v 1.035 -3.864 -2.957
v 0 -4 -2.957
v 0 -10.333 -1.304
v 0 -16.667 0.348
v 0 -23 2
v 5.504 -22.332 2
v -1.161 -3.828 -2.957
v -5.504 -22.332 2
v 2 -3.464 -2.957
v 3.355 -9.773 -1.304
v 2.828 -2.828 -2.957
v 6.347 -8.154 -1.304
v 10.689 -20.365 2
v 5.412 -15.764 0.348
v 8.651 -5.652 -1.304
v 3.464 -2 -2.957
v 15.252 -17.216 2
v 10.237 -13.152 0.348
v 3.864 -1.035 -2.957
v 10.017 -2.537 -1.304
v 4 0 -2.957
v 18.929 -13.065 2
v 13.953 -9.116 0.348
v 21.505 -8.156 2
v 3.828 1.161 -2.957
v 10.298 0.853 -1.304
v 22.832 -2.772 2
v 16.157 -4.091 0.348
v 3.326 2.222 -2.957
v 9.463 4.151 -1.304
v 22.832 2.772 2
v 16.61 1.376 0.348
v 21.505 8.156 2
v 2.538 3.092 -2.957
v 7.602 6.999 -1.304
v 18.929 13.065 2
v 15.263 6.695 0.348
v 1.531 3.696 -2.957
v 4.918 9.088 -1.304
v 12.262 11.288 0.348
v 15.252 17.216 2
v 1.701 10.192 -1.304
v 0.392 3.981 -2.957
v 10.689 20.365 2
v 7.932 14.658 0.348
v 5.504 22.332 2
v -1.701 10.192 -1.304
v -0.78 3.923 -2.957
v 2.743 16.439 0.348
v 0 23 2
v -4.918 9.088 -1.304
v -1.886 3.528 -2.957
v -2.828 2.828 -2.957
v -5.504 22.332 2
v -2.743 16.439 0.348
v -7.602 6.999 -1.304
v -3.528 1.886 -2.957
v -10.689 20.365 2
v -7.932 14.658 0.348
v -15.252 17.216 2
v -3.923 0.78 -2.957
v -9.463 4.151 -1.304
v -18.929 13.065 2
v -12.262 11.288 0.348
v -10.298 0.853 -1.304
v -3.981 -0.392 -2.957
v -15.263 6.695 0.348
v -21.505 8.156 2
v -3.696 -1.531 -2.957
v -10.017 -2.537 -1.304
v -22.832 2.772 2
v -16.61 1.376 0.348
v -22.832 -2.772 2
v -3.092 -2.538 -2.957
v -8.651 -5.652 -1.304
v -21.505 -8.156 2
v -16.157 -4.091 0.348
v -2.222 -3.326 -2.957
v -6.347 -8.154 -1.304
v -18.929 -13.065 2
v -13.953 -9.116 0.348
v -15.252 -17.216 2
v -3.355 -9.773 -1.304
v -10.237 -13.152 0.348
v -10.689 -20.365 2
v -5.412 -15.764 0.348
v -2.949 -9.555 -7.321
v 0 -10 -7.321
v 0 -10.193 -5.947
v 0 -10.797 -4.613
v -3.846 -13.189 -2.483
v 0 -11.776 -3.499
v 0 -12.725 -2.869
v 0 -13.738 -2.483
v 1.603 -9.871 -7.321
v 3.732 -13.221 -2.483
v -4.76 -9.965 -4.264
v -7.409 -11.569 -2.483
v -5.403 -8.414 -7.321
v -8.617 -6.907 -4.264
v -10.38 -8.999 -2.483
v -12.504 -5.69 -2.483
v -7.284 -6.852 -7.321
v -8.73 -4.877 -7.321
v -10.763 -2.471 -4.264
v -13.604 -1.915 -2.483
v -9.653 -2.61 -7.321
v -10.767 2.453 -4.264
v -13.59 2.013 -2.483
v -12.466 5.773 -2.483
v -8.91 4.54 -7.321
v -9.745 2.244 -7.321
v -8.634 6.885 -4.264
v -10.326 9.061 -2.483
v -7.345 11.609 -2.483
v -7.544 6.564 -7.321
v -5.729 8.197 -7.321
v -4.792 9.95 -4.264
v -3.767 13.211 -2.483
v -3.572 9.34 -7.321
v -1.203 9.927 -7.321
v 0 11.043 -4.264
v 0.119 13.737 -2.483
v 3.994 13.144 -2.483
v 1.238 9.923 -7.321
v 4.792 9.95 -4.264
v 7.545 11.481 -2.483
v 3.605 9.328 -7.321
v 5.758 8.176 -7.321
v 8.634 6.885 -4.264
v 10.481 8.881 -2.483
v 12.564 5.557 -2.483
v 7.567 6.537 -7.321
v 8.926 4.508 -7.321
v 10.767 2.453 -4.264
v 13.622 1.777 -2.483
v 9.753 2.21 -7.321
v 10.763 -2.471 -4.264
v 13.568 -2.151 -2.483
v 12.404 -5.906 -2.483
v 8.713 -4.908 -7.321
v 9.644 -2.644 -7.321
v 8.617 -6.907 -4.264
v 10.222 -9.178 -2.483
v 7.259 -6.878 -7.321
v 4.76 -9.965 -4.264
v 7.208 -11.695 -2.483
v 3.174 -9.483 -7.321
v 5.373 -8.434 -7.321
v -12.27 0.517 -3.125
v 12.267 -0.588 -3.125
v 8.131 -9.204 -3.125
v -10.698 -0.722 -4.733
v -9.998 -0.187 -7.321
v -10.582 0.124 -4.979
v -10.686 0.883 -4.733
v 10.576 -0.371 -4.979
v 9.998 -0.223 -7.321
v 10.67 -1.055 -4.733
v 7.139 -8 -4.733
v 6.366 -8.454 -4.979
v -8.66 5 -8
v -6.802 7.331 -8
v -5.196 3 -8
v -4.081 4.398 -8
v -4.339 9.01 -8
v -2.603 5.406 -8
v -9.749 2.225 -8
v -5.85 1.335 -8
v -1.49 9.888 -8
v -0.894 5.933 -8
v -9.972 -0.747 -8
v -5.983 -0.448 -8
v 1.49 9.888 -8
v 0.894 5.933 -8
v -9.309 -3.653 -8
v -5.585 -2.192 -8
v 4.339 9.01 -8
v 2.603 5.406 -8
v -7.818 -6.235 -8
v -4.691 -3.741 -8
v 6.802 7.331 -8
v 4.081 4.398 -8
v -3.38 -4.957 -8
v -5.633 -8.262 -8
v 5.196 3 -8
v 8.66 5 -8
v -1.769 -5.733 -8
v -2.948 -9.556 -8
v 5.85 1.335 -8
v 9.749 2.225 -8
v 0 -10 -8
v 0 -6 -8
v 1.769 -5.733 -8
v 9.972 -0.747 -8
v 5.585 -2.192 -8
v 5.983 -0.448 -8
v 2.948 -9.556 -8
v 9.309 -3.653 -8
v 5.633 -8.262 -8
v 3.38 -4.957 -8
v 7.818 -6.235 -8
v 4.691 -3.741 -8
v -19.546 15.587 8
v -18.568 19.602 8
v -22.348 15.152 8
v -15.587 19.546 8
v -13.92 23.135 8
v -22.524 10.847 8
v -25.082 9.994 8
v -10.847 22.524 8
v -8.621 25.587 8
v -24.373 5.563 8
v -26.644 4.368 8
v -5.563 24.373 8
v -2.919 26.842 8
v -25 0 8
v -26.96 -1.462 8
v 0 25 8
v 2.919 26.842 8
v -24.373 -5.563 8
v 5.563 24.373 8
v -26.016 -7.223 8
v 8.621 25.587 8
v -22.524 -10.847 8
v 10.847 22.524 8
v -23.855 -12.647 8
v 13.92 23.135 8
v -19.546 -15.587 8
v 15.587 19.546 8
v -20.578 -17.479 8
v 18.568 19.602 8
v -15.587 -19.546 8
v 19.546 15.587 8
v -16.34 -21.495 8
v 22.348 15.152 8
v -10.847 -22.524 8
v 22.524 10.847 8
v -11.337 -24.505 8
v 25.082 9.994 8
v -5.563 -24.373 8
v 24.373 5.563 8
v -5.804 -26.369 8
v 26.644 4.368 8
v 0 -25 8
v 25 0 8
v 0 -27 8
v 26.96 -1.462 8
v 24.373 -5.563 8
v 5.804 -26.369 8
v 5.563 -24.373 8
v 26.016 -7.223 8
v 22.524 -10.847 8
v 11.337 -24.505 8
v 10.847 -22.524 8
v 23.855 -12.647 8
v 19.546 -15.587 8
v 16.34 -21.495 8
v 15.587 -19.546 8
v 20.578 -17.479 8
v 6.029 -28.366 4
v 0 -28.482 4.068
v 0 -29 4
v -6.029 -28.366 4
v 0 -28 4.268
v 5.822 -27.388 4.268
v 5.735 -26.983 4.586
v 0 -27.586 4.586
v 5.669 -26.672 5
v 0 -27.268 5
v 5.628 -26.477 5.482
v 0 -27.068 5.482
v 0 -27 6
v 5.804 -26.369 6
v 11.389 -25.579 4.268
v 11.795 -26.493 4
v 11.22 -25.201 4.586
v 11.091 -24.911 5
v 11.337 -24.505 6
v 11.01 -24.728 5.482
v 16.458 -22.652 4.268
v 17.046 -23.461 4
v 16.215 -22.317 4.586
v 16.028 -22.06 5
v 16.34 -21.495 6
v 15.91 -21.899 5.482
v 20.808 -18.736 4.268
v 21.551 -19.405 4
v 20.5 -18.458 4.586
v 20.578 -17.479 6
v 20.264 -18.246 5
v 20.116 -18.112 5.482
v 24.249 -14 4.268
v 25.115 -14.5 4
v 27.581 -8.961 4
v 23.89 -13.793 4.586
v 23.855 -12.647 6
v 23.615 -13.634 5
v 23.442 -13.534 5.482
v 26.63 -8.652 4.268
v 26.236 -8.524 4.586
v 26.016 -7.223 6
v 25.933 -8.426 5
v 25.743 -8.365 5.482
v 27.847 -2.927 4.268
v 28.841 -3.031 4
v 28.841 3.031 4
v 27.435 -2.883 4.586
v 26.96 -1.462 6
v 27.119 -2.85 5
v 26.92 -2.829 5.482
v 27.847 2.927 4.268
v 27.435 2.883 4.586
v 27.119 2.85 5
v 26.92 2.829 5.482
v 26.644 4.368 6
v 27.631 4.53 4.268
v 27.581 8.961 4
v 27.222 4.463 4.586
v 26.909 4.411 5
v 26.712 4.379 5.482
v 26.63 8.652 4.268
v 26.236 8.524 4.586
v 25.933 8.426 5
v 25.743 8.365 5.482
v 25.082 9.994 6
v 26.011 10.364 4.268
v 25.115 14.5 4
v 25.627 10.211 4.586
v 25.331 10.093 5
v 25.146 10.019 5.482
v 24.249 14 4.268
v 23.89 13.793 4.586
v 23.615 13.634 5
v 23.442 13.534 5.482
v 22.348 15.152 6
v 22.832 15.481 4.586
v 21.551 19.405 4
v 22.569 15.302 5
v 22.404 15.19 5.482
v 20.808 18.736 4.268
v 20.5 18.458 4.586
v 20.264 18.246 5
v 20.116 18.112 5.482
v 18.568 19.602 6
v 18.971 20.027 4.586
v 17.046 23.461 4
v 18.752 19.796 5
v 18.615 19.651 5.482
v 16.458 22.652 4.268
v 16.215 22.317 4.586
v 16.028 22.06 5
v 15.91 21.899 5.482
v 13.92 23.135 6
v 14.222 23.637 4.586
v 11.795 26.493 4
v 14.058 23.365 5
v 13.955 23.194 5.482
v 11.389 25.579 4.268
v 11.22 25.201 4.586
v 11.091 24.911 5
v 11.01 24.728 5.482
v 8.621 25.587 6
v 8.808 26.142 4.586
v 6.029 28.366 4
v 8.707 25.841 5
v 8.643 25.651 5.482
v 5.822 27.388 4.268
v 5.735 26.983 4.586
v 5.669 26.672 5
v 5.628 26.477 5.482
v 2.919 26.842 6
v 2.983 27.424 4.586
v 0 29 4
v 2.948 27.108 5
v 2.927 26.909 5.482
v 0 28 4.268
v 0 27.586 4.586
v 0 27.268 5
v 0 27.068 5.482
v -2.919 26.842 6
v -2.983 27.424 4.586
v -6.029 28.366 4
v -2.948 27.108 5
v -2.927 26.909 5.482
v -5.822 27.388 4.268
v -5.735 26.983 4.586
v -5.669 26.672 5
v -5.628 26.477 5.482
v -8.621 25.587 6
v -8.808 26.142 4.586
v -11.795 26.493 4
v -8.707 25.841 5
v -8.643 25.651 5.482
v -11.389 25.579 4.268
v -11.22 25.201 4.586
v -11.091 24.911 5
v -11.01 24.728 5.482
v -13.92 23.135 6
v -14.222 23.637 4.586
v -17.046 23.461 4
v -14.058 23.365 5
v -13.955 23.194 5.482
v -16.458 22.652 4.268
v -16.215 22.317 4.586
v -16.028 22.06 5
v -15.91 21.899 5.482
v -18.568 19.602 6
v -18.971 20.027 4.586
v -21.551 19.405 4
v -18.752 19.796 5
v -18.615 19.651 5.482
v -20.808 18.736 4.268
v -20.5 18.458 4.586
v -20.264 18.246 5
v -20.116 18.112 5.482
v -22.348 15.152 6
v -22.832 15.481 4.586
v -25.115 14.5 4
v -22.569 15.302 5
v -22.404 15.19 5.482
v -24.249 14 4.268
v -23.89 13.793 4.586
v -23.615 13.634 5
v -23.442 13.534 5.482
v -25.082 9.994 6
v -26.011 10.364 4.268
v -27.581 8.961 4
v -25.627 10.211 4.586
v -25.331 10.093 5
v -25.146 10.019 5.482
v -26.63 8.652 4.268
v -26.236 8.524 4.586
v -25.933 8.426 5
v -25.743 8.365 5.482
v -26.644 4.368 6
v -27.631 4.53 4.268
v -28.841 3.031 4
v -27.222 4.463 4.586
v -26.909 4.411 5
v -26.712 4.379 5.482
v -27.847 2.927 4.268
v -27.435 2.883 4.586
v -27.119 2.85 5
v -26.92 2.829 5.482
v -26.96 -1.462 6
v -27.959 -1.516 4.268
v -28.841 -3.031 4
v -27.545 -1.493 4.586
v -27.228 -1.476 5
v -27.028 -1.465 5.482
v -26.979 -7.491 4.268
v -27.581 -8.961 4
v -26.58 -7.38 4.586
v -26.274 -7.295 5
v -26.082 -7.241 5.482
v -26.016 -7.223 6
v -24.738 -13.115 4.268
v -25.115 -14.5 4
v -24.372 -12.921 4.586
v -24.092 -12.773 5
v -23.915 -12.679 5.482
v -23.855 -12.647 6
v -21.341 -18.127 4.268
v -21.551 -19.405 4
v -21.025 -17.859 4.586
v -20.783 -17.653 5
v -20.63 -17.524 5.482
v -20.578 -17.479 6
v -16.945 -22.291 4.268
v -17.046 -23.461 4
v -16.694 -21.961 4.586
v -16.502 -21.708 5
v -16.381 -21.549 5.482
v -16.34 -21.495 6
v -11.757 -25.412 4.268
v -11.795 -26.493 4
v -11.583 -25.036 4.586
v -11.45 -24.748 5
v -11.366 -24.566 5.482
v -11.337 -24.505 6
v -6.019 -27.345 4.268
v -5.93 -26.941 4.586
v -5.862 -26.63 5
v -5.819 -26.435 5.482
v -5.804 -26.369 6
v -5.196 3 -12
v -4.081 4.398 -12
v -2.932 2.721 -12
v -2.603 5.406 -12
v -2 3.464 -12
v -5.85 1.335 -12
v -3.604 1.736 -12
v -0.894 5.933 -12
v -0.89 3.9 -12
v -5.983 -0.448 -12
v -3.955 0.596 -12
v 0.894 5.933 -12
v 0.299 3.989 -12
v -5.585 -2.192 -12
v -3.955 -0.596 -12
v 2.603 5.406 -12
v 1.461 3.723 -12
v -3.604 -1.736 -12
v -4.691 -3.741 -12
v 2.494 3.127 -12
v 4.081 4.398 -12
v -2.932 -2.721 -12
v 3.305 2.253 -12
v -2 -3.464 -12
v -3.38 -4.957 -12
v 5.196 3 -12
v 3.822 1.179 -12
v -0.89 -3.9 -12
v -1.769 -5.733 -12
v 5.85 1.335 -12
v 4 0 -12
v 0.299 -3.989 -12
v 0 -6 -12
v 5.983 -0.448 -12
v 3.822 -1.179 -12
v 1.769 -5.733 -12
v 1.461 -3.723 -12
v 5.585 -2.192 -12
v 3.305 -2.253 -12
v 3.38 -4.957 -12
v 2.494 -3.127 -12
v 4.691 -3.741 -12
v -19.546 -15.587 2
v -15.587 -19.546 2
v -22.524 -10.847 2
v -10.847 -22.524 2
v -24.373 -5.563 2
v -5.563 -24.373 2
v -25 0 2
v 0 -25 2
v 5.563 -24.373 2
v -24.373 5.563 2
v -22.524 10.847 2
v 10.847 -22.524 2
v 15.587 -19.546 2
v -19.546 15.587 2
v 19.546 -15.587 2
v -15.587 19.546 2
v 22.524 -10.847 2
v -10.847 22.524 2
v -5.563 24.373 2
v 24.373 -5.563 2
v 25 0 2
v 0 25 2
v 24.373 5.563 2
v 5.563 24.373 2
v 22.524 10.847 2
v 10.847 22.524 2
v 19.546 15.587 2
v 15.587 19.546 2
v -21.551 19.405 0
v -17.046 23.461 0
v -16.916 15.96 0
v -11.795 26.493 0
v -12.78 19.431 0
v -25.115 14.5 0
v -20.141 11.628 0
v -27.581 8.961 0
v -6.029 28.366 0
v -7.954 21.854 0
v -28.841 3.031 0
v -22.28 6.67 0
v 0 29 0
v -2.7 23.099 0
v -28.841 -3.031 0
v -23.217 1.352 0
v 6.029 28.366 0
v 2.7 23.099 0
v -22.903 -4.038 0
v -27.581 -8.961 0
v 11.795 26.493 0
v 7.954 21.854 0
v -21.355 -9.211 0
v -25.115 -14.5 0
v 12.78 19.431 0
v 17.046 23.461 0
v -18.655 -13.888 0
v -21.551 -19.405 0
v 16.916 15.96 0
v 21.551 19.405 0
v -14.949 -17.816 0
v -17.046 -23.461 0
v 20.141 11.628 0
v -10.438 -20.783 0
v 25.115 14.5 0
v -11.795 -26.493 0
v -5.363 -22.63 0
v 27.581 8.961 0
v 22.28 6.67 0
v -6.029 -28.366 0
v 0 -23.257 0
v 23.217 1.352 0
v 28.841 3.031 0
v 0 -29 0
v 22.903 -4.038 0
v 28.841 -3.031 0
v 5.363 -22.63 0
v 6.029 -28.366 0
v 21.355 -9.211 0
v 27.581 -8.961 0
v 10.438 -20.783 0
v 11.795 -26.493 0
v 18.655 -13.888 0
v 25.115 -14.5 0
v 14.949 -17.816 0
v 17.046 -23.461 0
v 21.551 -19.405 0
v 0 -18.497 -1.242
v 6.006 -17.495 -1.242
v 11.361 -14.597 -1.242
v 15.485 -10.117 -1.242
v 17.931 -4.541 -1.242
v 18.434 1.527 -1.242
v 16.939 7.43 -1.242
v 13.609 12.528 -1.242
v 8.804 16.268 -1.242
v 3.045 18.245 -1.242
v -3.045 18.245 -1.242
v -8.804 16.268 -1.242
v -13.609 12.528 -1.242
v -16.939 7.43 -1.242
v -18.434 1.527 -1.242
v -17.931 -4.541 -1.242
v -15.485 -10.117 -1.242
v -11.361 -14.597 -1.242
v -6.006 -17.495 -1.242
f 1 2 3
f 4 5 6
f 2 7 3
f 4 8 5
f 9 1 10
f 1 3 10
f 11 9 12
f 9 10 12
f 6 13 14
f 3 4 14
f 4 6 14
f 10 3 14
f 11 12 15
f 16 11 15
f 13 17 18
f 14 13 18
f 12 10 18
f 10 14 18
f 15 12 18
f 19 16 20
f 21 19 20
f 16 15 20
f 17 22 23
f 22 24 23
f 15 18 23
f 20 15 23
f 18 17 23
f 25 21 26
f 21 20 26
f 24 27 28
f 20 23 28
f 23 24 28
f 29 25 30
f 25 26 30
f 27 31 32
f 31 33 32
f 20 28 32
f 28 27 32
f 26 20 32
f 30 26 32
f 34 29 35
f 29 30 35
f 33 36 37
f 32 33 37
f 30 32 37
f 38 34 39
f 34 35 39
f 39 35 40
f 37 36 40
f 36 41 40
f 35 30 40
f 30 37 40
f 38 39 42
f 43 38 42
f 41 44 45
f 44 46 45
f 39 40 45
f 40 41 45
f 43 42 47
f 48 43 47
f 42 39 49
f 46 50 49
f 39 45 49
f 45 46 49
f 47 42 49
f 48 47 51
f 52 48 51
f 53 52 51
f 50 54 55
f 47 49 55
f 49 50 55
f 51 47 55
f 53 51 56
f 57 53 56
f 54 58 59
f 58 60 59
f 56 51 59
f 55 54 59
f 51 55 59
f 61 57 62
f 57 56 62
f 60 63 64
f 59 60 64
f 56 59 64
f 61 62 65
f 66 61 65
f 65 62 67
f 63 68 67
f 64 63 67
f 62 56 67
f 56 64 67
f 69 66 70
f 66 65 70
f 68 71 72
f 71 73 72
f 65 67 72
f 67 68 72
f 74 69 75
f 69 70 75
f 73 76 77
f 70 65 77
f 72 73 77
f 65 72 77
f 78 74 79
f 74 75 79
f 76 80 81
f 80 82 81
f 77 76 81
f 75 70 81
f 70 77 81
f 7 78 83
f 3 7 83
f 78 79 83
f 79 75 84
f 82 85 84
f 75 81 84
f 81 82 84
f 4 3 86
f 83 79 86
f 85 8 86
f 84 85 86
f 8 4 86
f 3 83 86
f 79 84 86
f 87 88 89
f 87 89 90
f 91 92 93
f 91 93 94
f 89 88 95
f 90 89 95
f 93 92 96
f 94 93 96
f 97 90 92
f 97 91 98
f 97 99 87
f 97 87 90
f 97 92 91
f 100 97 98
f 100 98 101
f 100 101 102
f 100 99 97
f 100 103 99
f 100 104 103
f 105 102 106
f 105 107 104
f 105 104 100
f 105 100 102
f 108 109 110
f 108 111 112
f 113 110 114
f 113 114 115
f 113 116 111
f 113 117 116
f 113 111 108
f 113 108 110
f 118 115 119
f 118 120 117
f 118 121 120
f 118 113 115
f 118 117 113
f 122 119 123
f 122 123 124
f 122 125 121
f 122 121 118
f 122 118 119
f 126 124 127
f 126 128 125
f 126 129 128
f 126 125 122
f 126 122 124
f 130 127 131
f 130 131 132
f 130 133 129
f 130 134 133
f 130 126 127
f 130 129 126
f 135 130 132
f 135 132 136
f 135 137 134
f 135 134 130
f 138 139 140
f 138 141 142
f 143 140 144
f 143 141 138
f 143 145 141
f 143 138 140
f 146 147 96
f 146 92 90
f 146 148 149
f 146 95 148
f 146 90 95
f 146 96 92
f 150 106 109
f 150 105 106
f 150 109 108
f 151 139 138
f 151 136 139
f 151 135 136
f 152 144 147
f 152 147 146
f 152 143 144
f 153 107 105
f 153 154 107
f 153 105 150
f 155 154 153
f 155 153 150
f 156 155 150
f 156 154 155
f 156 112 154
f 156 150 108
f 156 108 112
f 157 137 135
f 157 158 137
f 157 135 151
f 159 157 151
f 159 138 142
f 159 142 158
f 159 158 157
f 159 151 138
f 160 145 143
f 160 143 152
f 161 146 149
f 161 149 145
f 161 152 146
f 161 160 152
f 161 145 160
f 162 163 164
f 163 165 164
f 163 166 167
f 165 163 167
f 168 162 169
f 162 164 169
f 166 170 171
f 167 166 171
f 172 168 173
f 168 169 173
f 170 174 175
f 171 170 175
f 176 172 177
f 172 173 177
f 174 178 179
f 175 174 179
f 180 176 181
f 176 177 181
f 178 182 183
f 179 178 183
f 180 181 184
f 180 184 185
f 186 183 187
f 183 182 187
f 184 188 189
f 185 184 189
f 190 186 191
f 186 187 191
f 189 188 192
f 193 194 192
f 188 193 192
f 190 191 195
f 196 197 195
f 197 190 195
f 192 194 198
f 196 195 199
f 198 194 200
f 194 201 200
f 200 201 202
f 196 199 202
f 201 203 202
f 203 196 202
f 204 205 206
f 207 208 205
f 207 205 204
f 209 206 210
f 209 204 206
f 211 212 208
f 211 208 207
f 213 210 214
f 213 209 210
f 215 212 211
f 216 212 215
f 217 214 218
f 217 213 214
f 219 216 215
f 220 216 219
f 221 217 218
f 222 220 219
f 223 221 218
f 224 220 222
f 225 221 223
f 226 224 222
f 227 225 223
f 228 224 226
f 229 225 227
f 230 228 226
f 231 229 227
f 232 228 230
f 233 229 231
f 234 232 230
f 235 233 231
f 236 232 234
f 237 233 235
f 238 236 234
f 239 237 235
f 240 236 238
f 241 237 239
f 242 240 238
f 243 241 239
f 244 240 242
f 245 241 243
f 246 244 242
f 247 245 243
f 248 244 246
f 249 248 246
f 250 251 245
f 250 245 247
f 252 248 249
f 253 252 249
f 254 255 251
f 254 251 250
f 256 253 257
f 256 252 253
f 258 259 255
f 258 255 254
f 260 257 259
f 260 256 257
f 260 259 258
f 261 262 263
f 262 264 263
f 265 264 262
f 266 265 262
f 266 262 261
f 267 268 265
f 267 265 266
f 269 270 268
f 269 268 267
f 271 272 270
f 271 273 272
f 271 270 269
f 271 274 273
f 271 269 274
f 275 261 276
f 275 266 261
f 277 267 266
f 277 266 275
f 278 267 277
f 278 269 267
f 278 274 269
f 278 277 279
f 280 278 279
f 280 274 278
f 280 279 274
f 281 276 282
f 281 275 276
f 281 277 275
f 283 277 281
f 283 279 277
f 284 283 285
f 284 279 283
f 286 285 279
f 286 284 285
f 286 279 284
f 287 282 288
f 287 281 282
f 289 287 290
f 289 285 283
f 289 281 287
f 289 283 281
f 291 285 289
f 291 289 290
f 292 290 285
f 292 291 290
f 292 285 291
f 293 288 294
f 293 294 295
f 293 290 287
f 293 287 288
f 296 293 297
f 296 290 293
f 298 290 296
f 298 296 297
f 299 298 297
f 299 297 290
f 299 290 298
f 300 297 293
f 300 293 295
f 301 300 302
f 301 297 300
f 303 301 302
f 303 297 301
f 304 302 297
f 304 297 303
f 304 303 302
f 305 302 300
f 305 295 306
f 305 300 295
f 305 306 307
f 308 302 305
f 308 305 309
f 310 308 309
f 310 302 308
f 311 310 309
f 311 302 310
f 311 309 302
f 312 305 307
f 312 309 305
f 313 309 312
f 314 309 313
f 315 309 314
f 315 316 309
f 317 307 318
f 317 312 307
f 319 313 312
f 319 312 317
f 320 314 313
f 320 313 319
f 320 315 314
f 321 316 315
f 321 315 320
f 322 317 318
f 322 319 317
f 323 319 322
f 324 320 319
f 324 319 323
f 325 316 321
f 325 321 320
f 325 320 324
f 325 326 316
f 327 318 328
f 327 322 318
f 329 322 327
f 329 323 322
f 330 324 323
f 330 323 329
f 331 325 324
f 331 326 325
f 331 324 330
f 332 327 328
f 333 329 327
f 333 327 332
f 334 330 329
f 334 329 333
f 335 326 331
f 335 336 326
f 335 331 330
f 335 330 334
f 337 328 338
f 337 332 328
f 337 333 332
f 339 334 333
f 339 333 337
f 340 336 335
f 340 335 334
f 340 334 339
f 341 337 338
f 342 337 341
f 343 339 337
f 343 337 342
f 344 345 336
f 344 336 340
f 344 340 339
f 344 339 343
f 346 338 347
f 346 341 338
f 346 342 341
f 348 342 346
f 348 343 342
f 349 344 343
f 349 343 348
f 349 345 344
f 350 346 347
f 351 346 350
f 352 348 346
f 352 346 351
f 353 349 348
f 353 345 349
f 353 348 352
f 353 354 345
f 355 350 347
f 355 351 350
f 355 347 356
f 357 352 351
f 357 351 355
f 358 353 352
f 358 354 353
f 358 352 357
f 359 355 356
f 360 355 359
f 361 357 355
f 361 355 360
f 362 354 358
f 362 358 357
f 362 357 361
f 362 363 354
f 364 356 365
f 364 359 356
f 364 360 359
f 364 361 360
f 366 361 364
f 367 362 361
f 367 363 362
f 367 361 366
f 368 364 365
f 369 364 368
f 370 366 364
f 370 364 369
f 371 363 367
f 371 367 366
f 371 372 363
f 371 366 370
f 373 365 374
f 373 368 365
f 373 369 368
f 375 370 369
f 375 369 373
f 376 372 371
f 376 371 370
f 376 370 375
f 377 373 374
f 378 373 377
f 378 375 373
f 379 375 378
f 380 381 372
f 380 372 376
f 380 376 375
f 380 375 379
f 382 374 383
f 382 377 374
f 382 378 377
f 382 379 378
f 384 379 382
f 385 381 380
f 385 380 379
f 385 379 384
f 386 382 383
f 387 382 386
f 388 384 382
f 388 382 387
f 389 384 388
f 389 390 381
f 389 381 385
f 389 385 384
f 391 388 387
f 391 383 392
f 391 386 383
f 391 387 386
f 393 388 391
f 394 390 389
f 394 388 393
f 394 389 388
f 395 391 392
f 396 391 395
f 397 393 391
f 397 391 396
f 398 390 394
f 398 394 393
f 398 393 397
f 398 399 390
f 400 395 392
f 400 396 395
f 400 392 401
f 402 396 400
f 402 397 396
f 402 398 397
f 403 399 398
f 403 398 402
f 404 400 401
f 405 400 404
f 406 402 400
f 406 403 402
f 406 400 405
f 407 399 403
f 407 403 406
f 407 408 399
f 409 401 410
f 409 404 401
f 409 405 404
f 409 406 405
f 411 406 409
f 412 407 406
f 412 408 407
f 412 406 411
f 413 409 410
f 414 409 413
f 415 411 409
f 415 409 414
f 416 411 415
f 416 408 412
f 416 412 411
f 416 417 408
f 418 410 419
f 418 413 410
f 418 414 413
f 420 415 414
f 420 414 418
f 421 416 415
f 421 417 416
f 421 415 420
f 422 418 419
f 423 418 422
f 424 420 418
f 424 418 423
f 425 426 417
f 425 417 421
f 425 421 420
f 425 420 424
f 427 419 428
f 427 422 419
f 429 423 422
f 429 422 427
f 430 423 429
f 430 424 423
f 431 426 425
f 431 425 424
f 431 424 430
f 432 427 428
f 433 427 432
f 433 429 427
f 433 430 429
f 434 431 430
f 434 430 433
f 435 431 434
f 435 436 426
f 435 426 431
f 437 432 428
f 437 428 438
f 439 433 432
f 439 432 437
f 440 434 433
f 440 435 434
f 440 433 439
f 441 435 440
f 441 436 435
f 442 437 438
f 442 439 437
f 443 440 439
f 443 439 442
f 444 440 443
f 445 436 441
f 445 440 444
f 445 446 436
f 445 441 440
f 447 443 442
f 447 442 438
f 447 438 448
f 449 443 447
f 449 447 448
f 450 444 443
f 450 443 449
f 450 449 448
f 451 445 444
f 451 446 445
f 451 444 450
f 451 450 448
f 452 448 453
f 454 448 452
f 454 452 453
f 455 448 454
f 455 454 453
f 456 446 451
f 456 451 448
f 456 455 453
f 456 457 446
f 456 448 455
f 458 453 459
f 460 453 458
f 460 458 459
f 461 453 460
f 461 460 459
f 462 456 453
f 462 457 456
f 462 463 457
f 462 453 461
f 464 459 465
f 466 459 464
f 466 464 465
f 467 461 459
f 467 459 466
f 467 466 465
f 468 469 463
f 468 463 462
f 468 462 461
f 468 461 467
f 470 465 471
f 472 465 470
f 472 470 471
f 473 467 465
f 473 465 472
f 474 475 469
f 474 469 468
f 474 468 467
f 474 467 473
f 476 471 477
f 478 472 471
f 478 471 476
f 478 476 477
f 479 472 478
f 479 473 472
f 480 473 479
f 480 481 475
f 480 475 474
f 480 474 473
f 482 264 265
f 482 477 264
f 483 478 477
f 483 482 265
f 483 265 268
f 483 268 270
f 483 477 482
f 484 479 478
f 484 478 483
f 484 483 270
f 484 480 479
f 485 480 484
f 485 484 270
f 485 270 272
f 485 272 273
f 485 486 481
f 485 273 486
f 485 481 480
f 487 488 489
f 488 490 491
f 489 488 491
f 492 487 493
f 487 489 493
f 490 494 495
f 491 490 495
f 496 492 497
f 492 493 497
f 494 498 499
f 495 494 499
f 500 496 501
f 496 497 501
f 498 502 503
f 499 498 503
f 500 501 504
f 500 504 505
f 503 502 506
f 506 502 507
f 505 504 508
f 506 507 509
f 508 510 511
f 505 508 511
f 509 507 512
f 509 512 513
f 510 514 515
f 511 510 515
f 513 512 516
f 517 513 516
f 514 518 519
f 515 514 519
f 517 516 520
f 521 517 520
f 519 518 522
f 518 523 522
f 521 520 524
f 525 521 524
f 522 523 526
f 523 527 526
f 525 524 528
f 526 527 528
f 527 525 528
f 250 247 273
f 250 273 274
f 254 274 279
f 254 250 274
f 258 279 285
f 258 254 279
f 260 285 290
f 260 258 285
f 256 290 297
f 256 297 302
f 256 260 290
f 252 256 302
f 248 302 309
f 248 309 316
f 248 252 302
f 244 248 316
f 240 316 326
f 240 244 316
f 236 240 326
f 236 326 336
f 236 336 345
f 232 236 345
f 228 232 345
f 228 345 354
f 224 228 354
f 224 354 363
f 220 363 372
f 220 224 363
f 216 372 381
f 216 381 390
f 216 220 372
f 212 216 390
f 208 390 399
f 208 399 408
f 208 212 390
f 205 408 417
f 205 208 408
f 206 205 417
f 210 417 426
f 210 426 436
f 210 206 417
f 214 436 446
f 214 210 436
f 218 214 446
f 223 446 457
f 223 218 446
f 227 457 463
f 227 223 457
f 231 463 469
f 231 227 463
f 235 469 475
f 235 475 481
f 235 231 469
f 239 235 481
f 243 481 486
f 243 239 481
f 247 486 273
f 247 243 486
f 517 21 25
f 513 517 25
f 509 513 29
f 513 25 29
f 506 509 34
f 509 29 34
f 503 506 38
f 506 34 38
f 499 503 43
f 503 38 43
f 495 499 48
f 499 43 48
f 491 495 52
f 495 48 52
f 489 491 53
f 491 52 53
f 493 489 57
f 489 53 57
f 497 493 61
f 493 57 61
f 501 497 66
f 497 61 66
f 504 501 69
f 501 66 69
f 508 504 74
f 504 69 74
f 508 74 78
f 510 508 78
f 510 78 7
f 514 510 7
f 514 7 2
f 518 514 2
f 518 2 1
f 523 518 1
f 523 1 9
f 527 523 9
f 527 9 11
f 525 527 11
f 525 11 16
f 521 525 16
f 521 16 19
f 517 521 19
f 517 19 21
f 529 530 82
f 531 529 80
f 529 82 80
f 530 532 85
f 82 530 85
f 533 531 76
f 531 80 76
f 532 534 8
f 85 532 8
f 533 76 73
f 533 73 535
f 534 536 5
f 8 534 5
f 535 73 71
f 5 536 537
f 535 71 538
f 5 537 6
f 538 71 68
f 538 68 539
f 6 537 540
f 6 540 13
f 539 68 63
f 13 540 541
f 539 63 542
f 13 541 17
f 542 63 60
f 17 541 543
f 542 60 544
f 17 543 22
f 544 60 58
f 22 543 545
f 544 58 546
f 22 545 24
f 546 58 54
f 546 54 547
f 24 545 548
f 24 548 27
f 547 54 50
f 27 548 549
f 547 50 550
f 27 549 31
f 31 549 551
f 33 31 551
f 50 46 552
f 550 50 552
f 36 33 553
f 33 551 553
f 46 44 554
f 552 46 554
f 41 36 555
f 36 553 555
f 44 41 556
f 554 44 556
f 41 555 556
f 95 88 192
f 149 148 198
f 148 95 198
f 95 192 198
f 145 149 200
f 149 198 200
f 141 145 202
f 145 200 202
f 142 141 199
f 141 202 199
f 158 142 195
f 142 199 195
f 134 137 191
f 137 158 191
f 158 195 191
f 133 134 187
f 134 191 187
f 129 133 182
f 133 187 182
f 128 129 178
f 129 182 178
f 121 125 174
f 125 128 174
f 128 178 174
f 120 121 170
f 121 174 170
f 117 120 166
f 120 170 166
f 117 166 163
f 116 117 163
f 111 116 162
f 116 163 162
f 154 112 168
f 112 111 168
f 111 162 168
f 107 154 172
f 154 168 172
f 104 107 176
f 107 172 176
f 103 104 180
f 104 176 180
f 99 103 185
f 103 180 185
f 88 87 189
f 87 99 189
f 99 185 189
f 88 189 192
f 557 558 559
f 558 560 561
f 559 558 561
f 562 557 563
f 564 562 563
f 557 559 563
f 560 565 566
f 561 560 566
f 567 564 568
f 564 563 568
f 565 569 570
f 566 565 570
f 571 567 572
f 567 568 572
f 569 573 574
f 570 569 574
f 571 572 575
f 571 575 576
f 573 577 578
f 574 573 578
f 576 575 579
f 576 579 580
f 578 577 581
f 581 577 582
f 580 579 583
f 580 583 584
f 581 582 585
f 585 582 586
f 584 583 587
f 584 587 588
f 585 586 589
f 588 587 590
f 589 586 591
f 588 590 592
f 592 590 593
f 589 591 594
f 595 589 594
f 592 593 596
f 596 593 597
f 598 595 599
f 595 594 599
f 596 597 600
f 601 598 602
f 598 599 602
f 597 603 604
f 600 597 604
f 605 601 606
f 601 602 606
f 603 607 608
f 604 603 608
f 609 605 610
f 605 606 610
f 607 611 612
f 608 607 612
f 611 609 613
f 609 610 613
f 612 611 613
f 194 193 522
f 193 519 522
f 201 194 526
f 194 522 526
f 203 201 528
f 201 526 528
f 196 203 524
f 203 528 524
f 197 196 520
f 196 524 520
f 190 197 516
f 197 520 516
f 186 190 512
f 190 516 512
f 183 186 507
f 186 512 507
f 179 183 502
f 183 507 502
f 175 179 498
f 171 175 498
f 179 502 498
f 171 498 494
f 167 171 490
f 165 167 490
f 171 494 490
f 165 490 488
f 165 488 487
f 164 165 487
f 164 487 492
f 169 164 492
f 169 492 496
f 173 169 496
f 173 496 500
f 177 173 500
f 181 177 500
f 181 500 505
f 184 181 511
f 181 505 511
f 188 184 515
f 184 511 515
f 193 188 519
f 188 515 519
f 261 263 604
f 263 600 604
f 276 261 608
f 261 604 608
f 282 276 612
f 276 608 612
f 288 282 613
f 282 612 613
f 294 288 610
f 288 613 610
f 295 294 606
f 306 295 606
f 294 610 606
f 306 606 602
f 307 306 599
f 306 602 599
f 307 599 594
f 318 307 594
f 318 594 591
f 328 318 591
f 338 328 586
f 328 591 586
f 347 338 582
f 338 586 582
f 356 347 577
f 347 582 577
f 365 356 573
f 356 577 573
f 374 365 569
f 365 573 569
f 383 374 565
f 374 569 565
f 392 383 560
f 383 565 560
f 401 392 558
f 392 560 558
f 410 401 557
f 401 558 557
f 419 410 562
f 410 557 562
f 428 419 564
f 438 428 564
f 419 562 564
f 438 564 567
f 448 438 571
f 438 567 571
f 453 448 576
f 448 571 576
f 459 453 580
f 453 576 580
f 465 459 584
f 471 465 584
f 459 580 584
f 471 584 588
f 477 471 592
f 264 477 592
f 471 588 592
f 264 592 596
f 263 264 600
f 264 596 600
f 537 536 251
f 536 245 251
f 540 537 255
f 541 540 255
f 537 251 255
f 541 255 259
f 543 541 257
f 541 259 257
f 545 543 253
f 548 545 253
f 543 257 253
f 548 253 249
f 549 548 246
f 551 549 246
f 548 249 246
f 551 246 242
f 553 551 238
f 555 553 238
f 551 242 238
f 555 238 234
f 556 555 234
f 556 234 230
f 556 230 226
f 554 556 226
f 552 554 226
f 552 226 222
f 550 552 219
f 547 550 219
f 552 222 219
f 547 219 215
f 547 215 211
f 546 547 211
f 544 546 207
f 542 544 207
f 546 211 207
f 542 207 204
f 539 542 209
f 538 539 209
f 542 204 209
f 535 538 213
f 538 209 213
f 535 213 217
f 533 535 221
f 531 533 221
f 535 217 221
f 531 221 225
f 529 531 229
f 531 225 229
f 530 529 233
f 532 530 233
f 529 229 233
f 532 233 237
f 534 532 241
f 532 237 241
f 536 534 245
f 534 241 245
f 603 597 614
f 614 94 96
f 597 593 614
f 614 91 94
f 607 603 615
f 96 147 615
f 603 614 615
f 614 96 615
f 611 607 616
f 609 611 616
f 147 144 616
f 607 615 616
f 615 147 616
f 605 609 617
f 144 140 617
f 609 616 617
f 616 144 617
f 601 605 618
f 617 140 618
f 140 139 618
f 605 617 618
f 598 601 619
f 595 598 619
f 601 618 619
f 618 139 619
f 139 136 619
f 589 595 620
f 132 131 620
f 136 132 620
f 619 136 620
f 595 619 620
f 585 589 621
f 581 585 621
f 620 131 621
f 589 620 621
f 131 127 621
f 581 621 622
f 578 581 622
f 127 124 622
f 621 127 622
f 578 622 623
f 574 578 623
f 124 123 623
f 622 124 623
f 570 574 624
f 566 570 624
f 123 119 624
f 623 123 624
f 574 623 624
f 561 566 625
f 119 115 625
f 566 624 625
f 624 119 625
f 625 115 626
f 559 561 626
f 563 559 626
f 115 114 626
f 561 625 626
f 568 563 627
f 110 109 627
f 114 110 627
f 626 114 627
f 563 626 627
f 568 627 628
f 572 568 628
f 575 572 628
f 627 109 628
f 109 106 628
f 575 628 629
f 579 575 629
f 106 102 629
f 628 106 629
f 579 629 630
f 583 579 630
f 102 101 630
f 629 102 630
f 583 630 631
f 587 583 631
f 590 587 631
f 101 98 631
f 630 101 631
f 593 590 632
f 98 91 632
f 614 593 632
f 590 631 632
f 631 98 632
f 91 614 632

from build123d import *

# Parameters (mm, degrees)
F0_W     = 2
F0_H     = 4
F4_R     = 5
F5_R     = 4
F6_DEPTH = 25
F7_R     = 1.99999


# Not quite as in the source:
# - a fillet or chamfer is up to 0.001 mm smaller than in the source, because OpenCascade refuses the exact size
# - a feature names something its author has since deleted; it is built from what else it names


with BuildPart() as f1:
    # F0 (on Right) → F1 (revolve)
    with BuildSketch(Plane.YZ):
        with Locations((-26, 6)):
            Rectangle(F0_W, F0_H)
        Polygon((-29, 0), (-25, 0), (-25, 2), (-25, 4), (-27, 4), (-29, 4), align=None)
        Polygon((-25, 2), (-25, 0), (-23.256576216, 0), (0, -6.0669329259), (0, -4), (-23, 2), align=None)
    revolve(axis=Axis((0, 0, 1), (0, 0, 1)))

    # F2 (on Right) → F3 (revolve)
    with BuildSketch(Plane.YZ):
        Polygon((-10, -8), (-6, -8), (-6, -12), (0, -12), (0, -4), (-10, -1.3913043478), align=None)
    revolve(axis=Axis((0, 0, -8), (0, 0, 1)))

    # F4
    f4_edges = [f1.edges().sort_by_distance(p)[0] for p in [
        (0, 10, -3.458237),
    ]]
    fillet(f4_edges, radius=F4_R)

    # F5 (on Top) → F6 (cut)
    with BuildSketch(Plane.XY):
        Circle(F5_R)
    extrude(amount=-F6_DEPTH, mode=Mode.SUBTRACT)

    # F7 (radius 2 in the source; OpenCascade refuses exactly that, so slightly less here)
    f7_edges = [f1.edges().sort_by_distance(p)[0] for p in [
        (0, 27, 4),
    ]]
    fillet(f7_edges, radius=F7_R)


solid = f1.part
